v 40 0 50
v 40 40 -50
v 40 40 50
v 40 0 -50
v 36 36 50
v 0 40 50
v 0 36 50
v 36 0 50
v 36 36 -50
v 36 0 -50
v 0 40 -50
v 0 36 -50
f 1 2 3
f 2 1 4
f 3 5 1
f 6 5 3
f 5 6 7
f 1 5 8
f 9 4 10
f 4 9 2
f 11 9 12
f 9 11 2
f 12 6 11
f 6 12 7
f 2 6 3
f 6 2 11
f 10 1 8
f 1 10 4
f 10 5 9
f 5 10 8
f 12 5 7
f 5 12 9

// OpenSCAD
$fn=64;

module extrusion_4040(length=100, size=40, wall=2, slot=6, slot_depth=8, center_hole_d=8) {
    difference() {
        translate([0,0,-length/2])
            cube([size,size,length], center=false);

        // Center hole
        cylinder(h=length+2, d=center_hole_d, center=true);

        // Inner cavity to create wall thickness
        translate([0,0,-(length+2)/2])
            cube([size-2*wall, size-2*wall, length+2], center=false);

        // T-slots on four sides
        for (a = [0,90,180,270]) {
            rotate([0,0,a]) {
                // Slot opening
                translate([size/2 - slot_depth/2, 0, 0])
                    cube([slot_depth, slot, length+2], center=true);
                // Slot undercut (wider inside)
                translate([size/2 - (slot_depth + wall)/2, 0, 0])
                    cube([slot_depth + wall, slot + 4, length+2], center=true);
            }
        }
    }
}

extrusion_4040(100, 40, 2, 6, 8, 8);
